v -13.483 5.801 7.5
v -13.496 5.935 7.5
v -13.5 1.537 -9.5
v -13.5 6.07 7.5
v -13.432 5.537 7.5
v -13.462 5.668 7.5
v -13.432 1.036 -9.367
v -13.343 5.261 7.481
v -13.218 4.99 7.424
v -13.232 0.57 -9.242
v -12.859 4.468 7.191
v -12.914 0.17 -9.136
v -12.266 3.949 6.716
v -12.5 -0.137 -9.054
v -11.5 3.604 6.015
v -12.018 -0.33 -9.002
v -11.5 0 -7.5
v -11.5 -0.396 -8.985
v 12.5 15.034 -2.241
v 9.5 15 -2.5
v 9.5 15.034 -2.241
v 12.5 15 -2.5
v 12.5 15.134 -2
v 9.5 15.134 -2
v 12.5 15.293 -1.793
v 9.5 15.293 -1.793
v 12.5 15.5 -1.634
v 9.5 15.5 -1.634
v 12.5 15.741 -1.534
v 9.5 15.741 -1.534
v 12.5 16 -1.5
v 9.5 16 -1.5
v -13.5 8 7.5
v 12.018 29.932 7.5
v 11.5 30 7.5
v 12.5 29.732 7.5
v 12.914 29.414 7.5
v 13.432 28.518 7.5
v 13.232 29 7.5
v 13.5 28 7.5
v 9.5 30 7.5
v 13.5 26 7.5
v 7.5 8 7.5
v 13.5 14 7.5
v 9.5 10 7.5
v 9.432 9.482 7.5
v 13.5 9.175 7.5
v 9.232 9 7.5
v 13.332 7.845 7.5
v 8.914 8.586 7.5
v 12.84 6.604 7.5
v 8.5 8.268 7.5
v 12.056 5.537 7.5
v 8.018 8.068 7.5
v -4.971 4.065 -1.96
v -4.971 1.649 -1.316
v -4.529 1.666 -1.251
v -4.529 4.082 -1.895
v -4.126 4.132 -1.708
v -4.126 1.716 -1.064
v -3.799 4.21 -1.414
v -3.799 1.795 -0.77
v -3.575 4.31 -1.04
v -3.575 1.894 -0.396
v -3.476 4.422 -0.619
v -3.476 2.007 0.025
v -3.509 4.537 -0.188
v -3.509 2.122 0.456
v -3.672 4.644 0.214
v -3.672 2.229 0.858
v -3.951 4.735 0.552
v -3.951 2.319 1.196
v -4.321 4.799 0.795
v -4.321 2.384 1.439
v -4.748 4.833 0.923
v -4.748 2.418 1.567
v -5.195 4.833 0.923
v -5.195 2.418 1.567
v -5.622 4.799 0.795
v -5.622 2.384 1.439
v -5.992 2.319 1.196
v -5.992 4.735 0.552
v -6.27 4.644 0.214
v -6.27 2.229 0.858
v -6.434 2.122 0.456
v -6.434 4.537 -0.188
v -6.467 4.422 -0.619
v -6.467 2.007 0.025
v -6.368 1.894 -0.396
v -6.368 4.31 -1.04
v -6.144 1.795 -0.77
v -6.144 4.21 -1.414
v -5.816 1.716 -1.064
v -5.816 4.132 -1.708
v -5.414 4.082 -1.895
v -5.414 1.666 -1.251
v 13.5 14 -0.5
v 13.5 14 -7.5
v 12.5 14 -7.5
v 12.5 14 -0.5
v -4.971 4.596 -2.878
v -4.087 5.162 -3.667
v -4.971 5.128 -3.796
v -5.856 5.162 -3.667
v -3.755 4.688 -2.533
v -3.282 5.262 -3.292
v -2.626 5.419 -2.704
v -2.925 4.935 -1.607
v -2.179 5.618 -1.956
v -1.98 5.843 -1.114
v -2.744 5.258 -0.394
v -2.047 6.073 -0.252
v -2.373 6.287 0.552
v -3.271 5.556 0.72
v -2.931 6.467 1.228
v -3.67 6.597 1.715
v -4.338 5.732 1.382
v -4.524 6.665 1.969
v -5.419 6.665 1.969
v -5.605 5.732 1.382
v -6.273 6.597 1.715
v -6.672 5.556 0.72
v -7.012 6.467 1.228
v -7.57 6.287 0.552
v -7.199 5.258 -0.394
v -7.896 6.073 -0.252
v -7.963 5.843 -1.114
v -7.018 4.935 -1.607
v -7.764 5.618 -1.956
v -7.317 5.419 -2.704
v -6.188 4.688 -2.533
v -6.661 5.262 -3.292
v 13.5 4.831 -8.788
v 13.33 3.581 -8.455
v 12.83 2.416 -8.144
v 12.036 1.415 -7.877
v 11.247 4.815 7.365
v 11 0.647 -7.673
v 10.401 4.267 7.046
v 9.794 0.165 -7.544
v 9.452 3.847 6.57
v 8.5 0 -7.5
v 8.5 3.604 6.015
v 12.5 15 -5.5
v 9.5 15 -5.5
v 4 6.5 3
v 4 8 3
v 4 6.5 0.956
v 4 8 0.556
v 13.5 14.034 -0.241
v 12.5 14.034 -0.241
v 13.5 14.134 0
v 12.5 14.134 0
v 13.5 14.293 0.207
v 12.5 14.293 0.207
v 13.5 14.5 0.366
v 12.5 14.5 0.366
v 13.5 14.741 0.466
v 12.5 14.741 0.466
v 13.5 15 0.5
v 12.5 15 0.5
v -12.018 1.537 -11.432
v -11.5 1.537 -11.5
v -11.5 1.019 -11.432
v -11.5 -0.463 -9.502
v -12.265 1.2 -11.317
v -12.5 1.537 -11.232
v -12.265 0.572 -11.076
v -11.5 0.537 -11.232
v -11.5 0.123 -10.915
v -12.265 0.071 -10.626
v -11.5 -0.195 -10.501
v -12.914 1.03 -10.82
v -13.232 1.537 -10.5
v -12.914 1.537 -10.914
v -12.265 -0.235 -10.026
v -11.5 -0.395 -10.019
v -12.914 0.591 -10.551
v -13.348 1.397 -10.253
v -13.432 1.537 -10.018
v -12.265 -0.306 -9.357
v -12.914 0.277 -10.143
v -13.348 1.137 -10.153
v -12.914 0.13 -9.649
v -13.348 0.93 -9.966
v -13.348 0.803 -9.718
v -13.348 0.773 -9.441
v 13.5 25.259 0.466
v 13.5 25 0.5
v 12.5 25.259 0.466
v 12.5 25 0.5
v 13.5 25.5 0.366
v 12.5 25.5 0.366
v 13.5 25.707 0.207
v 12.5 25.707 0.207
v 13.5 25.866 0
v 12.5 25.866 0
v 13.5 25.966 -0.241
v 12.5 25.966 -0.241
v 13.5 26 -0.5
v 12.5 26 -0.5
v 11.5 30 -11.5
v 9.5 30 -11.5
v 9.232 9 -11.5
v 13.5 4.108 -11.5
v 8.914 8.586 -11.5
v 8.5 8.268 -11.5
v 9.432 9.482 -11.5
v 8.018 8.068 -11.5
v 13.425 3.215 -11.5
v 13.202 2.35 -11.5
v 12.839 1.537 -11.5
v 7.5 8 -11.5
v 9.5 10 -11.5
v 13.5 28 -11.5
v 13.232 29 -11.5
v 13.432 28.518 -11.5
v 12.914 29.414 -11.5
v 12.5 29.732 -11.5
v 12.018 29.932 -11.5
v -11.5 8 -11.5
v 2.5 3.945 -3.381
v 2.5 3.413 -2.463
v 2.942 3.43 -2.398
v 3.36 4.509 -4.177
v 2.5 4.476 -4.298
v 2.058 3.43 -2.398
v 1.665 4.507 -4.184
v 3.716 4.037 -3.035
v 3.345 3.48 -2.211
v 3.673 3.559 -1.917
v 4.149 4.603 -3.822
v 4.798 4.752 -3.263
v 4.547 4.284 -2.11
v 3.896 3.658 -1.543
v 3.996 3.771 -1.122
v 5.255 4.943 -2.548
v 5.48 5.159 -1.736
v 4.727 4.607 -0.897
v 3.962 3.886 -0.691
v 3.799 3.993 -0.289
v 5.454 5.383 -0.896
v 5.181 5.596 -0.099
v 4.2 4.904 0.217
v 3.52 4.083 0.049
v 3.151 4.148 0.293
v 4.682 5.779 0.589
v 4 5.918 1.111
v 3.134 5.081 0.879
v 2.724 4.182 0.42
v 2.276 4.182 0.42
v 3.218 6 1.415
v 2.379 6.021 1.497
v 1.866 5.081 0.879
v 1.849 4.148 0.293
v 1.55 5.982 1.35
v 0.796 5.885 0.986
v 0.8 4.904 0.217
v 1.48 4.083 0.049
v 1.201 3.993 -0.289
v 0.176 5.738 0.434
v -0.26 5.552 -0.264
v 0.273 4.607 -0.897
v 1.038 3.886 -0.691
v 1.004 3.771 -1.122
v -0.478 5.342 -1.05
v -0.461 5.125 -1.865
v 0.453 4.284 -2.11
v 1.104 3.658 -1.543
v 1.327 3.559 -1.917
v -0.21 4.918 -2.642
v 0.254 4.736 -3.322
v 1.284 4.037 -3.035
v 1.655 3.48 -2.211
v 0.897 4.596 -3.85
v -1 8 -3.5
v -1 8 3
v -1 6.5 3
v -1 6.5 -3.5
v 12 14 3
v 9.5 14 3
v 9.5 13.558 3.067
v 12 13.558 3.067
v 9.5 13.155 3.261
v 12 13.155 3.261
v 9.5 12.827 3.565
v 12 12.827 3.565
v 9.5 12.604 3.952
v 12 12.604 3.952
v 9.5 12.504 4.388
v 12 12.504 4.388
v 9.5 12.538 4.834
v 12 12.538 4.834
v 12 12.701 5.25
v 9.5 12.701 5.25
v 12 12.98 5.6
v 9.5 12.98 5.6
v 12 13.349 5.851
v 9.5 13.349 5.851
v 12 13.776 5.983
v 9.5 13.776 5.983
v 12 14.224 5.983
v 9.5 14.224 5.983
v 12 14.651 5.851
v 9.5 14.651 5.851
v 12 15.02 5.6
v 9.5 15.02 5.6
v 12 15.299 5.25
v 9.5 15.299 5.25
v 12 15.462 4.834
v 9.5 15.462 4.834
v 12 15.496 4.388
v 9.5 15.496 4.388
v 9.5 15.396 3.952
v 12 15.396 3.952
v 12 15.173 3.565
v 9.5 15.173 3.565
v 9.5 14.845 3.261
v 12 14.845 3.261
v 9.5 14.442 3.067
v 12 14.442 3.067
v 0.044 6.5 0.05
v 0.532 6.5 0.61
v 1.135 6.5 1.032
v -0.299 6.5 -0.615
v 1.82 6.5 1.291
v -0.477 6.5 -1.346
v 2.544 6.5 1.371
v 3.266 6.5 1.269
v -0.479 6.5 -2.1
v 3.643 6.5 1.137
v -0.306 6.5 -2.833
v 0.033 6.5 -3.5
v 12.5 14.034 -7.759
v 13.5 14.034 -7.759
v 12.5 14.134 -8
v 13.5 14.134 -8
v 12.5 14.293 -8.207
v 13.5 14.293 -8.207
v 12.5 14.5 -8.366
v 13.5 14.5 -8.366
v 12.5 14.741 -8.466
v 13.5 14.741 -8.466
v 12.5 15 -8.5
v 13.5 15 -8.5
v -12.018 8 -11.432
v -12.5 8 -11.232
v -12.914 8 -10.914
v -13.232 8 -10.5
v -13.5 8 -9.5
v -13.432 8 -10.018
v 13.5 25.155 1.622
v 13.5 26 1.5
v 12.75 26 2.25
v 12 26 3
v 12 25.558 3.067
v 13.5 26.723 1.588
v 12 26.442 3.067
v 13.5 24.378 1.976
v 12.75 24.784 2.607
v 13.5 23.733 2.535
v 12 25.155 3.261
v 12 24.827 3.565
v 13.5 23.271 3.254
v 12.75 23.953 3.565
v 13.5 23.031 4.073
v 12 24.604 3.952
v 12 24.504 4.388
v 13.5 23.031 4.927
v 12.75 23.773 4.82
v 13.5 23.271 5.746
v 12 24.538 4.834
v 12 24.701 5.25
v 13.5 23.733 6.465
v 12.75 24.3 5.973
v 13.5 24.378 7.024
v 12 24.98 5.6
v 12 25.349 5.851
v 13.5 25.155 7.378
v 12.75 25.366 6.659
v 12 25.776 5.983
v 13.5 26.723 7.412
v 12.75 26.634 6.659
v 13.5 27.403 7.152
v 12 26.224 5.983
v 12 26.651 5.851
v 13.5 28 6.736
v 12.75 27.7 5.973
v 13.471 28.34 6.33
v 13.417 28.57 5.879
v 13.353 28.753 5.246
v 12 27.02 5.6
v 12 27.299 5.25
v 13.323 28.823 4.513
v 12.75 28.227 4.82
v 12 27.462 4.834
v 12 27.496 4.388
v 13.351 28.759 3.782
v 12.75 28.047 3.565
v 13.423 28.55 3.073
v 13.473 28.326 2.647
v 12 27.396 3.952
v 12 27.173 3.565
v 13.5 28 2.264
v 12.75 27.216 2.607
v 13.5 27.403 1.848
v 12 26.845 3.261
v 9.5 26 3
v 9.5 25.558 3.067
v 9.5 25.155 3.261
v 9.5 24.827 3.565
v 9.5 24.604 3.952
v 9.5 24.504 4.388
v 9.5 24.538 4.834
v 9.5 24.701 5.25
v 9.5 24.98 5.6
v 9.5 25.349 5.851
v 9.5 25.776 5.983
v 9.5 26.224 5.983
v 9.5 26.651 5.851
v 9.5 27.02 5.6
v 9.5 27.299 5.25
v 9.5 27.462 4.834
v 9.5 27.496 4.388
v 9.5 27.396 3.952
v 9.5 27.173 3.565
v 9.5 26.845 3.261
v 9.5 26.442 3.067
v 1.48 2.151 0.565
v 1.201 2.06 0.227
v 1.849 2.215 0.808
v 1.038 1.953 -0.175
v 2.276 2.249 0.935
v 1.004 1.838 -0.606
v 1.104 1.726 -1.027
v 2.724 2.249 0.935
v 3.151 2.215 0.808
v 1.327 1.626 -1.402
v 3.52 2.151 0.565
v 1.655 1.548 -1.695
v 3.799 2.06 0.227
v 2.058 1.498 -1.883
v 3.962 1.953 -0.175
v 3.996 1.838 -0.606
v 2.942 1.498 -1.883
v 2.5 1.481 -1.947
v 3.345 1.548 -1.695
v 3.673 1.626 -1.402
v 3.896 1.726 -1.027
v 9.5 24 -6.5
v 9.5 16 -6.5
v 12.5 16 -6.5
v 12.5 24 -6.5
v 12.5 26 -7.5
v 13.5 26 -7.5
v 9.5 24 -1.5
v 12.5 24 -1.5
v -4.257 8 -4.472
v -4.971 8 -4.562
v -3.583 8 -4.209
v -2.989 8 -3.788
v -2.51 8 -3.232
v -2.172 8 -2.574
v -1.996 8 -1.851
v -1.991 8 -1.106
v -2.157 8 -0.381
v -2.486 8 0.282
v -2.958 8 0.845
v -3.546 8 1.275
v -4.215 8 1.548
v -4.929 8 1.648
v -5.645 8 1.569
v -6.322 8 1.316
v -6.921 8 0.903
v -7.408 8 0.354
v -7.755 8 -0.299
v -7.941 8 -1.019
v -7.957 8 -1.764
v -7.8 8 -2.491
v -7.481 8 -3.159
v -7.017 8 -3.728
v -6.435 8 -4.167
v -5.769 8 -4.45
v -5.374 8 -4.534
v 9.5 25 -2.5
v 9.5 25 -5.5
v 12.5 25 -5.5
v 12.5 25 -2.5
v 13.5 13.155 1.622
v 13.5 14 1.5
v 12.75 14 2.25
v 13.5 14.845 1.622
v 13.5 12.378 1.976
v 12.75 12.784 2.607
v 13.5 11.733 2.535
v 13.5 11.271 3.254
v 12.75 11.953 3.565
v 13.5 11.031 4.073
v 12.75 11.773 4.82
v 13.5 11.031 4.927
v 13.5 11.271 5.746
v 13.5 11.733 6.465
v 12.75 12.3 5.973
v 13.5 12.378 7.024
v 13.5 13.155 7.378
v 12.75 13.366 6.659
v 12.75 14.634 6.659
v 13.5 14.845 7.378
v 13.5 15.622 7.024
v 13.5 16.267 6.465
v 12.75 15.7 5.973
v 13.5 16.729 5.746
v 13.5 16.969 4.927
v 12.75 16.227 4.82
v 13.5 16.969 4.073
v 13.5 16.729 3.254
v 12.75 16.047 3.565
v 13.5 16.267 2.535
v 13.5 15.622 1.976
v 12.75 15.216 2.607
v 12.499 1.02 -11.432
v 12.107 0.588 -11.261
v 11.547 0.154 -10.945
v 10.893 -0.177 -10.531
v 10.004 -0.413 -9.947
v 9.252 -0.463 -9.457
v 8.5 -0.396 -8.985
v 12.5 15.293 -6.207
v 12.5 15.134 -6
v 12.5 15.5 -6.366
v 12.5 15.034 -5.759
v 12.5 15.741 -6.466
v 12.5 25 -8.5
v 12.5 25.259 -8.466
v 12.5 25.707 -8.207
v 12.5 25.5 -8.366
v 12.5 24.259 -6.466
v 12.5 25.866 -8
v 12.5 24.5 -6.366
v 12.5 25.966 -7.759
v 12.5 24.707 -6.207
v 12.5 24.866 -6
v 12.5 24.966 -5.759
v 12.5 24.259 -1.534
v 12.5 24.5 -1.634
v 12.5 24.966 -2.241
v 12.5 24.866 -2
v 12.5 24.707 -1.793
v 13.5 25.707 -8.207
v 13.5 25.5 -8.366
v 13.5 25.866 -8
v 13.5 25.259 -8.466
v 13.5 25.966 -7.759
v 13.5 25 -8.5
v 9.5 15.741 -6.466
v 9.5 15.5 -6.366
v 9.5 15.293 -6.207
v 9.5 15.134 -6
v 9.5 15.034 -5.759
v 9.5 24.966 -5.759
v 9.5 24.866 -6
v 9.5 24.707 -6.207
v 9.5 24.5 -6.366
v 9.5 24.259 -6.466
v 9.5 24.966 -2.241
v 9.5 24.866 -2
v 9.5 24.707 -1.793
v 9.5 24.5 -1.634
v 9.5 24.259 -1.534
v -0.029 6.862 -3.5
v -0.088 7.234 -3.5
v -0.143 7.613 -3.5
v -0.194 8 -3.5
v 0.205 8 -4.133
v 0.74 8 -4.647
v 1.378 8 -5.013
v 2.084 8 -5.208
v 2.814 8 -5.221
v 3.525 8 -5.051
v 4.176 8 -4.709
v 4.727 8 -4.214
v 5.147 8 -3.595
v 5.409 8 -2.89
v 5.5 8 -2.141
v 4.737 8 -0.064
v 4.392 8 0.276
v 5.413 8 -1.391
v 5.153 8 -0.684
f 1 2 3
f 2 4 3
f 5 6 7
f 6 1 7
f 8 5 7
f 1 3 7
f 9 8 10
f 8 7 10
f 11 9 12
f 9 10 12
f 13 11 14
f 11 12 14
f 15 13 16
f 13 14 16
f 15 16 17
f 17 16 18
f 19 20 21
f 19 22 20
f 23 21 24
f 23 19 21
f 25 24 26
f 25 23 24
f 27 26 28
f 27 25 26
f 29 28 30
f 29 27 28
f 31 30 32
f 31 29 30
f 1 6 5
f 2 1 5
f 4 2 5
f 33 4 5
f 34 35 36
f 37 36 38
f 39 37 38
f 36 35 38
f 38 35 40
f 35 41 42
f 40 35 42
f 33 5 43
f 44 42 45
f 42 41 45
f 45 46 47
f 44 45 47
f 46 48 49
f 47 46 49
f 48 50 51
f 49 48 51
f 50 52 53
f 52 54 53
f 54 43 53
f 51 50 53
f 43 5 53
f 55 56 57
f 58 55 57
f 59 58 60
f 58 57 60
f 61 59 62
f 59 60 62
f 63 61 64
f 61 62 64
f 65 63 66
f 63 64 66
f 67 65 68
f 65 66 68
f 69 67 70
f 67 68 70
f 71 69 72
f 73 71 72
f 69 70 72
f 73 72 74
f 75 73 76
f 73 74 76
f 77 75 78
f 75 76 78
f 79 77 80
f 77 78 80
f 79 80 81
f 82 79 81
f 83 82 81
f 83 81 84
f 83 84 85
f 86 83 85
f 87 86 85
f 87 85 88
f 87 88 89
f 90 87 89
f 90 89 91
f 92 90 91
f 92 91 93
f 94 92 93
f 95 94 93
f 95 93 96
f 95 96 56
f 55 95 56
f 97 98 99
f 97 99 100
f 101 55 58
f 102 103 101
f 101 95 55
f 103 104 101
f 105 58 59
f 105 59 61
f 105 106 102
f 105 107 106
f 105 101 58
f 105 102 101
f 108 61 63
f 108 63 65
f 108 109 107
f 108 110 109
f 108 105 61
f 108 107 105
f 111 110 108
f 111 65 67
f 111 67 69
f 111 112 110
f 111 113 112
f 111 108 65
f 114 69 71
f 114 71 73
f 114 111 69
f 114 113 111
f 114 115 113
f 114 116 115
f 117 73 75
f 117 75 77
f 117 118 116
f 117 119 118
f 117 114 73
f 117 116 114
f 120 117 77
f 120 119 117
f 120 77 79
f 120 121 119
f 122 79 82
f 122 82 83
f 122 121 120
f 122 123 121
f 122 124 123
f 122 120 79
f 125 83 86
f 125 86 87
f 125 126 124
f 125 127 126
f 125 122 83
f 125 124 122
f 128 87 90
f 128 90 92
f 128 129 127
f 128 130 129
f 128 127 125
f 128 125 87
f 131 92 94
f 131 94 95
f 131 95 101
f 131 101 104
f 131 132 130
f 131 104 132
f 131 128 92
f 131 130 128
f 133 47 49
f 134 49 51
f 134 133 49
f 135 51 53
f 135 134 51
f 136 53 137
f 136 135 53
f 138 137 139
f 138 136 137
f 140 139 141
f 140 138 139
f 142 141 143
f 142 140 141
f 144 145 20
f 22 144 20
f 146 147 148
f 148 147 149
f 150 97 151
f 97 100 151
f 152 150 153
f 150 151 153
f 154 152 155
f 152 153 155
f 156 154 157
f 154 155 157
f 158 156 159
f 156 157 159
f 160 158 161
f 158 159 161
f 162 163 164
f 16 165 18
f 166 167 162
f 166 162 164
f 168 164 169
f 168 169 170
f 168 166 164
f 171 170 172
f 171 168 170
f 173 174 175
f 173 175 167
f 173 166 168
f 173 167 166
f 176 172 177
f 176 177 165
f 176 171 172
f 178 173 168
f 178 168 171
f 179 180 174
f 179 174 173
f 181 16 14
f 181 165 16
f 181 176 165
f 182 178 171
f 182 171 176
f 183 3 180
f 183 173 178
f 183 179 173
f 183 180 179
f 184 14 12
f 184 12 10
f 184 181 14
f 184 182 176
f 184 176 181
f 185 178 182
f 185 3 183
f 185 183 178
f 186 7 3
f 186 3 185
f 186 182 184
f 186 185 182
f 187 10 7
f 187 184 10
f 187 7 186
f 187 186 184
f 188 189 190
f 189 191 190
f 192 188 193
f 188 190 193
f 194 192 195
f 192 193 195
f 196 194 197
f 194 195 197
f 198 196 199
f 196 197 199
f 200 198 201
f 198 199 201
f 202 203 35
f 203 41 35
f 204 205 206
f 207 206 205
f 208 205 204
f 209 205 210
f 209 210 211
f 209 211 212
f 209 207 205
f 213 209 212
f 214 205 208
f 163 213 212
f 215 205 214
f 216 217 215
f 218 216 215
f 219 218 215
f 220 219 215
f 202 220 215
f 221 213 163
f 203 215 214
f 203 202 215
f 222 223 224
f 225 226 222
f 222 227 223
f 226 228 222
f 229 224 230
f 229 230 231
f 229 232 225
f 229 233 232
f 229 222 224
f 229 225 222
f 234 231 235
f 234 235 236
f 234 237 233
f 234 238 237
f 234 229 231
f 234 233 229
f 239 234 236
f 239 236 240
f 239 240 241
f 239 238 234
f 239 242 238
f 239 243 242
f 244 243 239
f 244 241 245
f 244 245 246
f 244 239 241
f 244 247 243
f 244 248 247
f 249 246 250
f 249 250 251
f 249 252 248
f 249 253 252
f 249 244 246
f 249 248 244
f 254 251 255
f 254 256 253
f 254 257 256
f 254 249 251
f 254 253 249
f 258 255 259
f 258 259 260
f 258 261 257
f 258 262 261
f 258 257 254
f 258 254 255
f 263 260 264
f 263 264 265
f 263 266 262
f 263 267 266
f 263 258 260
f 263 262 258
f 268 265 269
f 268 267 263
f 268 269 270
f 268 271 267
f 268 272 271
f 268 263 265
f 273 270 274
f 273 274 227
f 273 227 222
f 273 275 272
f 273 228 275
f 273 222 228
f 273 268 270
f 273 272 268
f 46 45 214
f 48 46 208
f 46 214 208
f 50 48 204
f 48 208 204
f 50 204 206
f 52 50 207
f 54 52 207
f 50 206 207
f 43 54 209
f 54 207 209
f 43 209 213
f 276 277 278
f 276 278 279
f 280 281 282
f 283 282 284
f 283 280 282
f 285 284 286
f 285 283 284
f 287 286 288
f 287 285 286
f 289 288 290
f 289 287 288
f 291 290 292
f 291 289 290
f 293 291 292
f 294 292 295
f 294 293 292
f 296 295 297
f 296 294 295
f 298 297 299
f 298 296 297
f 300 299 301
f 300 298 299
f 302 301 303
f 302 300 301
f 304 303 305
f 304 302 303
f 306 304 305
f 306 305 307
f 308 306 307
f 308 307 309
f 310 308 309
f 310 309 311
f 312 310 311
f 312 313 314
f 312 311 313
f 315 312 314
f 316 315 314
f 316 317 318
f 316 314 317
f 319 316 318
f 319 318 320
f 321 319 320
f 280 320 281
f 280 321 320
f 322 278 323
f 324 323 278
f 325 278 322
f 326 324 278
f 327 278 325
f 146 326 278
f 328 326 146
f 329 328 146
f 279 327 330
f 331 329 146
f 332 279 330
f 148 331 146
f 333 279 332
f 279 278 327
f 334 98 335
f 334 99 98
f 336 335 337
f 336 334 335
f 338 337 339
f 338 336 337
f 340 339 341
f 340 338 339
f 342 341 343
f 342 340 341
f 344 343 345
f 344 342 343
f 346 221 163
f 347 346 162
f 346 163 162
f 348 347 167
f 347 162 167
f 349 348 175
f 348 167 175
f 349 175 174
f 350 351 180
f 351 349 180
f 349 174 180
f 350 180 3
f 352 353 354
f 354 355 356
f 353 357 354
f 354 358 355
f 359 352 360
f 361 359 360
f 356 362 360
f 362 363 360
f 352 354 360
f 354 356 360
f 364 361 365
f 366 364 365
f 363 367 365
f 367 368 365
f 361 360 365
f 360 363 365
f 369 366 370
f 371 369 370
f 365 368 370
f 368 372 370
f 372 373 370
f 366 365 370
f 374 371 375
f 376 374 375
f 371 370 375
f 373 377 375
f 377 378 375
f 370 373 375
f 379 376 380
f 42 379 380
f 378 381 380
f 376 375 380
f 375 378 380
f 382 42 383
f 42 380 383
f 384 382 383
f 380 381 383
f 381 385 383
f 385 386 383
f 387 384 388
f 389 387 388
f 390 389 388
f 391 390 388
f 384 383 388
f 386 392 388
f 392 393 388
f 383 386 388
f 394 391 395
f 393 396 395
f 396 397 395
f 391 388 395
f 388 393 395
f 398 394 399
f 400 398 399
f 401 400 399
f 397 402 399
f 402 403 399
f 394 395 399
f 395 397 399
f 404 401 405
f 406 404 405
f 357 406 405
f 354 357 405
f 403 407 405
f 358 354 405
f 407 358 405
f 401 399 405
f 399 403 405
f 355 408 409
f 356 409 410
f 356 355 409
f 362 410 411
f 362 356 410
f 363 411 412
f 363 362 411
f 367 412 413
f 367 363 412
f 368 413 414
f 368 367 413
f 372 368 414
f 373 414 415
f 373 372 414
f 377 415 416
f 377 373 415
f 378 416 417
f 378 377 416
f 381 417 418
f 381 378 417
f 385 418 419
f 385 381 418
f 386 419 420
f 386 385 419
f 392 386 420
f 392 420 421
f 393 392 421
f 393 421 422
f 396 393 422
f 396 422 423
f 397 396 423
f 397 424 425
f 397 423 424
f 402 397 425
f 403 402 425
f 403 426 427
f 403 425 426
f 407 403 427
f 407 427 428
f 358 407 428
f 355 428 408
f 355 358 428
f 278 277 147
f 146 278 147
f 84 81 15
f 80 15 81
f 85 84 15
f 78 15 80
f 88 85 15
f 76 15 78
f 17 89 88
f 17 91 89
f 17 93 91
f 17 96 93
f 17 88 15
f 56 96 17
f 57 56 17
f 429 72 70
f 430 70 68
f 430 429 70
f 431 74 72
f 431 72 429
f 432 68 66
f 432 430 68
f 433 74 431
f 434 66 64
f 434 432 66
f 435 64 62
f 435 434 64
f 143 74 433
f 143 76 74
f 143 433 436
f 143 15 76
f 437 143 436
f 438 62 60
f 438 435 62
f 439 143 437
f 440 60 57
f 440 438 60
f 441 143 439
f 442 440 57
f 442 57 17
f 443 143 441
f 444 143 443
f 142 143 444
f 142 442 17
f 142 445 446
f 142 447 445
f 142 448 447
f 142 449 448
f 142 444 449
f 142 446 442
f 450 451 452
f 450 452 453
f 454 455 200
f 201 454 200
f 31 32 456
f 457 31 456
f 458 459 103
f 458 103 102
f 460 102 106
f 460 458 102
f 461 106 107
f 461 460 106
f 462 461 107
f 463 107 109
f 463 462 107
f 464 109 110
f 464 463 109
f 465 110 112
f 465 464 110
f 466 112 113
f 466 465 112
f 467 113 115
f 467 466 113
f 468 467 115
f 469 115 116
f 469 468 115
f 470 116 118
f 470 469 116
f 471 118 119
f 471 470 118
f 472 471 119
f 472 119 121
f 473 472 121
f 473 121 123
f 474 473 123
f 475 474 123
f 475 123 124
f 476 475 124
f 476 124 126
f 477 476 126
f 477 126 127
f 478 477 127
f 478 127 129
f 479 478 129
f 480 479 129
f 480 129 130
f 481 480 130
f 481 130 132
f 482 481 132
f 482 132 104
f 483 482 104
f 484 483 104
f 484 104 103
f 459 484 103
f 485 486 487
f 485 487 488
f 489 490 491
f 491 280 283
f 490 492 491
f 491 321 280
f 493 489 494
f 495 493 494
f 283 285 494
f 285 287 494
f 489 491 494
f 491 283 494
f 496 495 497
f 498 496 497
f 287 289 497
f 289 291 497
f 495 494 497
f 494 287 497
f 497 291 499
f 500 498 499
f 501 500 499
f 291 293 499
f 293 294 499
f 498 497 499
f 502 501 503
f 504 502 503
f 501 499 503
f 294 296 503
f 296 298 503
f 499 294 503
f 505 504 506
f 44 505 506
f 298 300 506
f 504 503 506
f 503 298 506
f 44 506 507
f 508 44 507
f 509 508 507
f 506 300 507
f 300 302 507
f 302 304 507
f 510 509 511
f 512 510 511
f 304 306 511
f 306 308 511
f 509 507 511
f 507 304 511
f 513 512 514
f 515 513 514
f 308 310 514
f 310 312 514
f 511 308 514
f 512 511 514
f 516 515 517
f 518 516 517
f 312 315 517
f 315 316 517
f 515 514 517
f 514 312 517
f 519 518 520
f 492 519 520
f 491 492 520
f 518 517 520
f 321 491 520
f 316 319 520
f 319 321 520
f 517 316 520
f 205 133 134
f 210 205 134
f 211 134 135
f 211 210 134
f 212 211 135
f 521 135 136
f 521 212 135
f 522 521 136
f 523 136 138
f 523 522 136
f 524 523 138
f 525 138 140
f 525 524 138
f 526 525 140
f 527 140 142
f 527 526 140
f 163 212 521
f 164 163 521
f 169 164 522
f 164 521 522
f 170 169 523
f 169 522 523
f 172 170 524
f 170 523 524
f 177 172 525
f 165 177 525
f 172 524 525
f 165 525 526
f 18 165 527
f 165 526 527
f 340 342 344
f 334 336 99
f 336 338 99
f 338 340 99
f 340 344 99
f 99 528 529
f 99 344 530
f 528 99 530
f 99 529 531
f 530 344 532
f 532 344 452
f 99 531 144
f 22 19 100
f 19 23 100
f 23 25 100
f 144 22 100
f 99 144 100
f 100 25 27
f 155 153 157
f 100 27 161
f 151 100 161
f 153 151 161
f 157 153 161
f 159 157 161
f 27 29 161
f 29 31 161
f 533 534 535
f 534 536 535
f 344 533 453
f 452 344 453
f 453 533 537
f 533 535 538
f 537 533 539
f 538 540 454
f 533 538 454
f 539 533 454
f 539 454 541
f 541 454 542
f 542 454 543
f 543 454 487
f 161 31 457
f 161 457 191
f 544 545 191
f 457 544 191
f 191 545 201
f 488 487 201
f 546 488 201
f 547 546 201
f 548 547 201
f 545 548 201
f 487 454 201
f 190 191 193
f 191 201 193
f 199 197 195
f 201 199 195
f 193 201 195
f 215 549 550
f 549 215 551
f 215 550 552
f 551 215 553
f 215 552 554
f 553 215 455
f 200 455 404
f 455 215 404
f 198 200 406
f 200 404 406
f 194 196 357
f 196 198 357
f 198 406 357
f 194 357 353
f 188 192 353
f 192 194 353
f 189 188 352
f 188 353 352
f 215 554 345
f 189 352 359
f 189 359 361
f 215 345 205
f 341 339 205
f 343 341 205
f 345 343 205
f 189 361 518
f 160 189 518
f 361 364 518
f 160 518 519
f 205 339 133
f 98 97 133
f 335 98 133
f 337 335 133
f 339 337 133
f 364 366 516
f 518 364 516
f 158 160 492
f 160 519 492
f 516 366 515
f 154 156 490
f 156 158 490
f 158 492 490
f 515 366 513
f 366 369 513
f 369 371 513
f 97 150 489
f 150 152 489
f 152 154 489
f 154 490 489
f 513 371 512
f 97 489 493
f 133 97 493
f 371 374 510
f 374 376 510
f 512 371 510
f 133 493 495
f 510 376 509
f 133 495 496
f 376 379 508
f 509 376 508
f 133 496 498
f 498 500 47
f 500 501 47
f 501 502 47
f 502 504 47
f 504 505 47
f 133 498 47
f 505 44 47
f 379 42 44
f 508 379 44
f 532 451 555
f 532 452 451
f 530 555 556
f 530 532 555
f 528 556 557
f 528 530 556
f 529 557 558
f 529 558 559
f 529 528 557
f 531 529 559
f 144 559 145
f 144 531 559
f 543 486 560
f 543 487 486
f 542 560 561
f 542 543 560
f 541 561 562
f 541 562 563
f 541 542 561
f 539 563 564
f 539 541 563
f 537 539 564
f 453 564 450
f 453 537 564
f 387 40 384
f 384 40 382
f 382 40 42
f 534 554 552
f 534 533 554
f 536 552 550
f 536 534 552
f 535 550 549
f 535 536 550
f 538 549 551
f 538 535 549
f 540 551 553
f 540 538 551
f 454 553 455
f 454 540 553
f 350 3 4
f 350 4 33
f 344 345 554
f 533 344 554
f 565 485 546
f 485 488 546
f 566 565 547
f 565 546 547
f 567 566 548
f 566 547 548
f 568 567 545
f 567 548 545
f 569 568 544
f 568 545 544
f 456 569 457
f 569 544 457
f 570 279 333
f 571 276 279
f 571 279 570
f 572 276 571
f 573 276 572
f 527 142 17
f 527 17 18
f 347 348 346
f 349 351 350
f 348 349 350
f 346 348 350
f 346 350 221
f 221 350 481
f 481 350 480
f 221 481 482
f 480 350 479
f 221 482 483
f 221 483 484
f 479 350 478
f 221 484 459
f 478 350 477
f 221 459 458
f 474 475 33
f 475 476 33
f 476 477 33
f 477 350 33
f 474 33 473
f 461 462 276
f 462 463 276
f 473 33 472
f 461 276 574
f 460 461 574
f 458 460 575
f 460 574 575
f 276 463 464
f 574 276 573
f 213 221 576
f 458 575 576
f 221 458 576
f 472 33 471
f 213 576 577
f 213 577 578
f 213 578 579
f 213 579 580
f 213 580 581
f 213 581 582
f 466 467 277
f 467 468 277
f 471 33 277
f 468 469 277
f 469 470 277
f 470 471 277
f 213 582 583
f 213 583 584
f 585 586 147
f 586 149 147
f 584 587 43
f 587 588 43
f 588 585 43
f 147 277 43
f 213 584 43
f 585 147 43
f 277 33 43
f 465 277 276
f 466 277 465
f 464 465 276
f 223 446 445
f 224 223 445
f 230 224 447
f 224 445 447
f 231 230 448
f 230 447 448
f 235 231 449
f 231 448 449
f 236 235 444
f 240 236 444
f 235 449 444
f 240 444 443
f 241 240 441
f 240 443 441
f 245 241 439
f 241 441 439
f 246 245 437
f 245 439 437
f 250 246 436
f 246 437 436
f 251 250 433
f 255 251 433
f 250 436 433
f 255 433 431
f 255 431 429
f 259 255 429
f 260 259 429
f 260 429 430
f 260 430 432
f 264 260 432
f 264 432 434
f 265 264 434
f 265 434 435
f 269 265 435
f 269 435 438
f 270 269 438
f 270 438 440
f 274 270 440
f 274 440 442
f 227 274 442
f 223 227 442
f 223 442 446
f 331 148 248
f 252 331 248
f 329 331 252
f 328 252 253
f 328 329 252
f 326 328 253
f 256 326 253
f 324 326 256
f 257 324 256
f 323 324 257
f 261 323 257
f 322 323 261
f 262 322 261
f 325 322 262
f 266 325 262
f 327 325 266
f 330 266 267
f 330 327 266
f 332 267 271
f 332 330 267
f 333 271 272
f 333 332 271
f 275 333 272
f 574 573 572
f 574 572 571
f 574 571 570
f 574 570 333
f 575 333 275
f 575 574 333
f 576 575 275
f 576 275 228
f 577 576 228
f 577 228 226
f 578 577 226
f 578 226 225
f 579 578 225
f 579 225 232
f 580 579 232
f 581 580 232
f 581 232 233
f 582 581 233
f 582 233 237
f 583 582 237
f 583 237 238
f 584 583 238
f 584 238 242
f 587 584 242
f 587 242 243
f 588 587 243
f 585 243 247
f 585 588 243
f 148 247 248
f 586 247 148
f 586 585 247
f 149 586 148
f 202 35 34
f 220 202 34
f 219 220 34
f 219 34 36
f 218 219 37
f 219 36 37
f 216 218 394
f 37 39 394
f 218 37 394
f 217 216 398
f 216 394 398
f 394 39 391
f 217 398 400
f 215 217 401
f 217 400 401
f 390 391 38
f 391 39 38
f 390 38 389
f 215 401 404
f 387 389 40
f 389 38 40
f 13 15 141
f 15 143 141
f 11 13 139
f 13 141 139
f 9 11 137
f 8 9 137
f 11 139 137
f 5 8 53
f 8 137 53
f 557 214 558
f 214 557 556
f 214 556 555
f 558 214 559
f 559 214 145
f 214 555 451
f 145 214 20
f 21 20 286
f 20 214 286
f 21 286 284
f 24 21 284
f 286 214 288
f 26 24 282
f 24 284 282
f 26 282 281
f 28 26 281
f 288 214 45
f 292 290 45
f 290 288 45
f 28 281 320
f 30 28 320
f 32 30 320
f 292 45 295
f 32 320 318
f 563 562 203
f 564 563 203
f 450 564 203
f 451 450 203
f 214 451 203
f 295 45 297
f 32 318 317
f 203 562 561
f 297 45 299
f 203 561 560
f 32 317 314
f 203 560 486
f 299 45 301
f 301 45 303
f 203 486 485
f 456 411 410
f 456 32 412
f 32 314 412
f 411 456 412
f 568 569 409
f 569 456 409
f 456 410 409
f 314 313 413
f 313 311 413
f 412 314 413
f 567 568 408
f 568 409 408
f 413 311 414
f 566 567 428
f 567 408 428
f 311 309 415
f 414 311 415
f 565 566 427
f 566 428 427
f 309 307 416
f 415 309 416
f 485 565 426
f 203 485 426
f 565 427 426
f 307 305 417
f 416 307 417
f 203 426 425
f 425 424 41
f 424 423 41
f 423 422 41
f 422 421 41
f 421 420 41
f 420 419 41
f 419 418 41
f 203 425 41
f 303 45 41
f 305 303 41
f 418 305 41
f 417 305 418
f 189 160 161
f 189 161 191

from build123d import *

# Parameters (mm, degrees)
SKETCH_1_W                = 27
SKETCH_1_H                = 15
EXTRUDE_1_DEPTH           = 8
CUT_EXTRUDE_8_DEPTH       = 41.5
SKETCH_5_W                = 4
SKETCH_5_H                = 15
EXTRUDE_3_DEPTH           = 24
SKETCH_7_W                = 5
SKETCH_7_H                = 6.5
CUT_EXTRUDE_5_DEPTH       = 1.5
SKETCH_10_R               = 1.5
CUT_EXTRUDE_6_DEPTH       = 21.5
SKETCH_12_W               = 5
SKETCH_12_H               = 10
CUT_EXTRUDE_7_DEPTH       = 21.5
SKETCH_14_W               = 4
SKETCH_14_H               = 2
CUT_EXTRUDE_9_DEPTH       = 21.5
SKETCH_15_R               = 1.5
CUT_EXTRUDE_10_DEPTH      = 21.5
EXTRUDE_6_DEPTH           = 4
CUT_EXTRUDE_13_DEPTH      = 1.5
CUT_EXTRUDE_13_DEPTH_BACK = 12
SKETCH_17_R               = 3
CUT_EXTRUDE_15_DEPTH      = 1
CUT_EXTRUDE_15_DEPTH_BACK = 2.5
SKETCH_19_R               = 3
CUT_EXTRUDE_16_DEPTH      = 54
SKETCH_23_W               = 9
SKETCH_23_H               = 12
CUT_EXTRUDE_17_DEPTH      = 1
FILLET_2_R                = 2
FILLET_3_R                = 2
FILLET_4_R                = 5
CHAMFER_1_SIZE            = 1.5
FILLET_5_R                = 2
FILLET_8_R                = 1


with BuildPart() as part:
    # 草图1 → 凸台-拉伸1 (new body)
    with BuildSketch(Plane(origin=(0, 0, 0), x_dir=(1, 0, 0), z_dir=(0, 1, 0))):
        Rectangle(SKETCH_1_W, SKETCH_1_H)
    extrude(amount=EXTRUDE_1_DEPTH)

    # 草图13 → 切除-拉伸8 (cut)
    with BuildSketch(Plane(origin=(13.5, 0, 0), x_dir=(0, 0, -1), z_dir=(1, 0, 0))):
        Polygon((-7.5, 4), (7.5, 0), (-7.5, 0), align=None)
    extrude(amount=-CUT_EXTRUDE_8_DEPTH, mode=Mode.SUBTRACT)

    # 草图5 → 凸台-拉伸3 (add)
    with BuildSketch(Plane(origin=(0, 8, 0), x_dir=(1, 0, 0), z_dir=(0, 1, 0))):
        with Locations((11.5, 0)):
            Rectangle(SKETCH_5_W, SKETCH_5_H)
    extrude(amount=EXTRUDE_3_DEPTH)

    # 草图7 → 切除-拉伸5 (cut)
    with BuildSketch(Plane(origin=(0, 8, 0), x_dir=(1, 0, 0), z_dir=(0, 1, 0))):
        with Locations((1.5, 0.25)):
            Rectangle(SKETCH_7_W, SKETCH_7_H)
    extrude(amount=-CUT_EXTRUDE_5_DEPTH, mode=Mode.SUBTRACT)

    # 草图10 → 切除-拉伸6 (cut)
    with BuildSketch(Plane.ZY.offset(-13.5)):
        with Locations(Location((4.5, 14, 0), (0, 0, 180))):
            Circle(SKETCH_10_R)
        with Locations(Location((4.5, 26, 0), (0, 0, 180))):
            Circle(SKETCH_10_R)
    extrude(amount=CUT_EXTRUDE_6_DEPTH, mode=Mode.SUBTRACT)

    # 草图12 → 切除-拉伸7 (cut)
    with BuildSketch(Plane.ZY.offset(-9.5)):
        with Locations((-4, 20)):
            Rectangle(SKETCH_12_W, SKETCH_12_H)
    extrude(amount=-CUT_EXTRUDE_7_DEPTH, mode=Mode.SUBTRACT)

    # 草图14 → 切除-拉伸9 (cut)
    with BuildSketch(Plane.XY.offset(7.5)):
        with Locations((11.5, 31)):
            Rectangle(SKETCH_14_W, SKETCH_14_H)
    extrude(amount=-CUT_EXTRUDE_9_DEPTH, mode=Mode.SUBTRACT)

    # 草图15 → 切除-拉伸10 (cut)
    with BuildSketch(Plane(origin=(0, 1.867219917, -0.497925311), x_dir=(1, 0, 0), z_dir=(0, -0.9662349396012463, 0.25766265056033233))):
        with Locations(Location((-4.971460236, 0.653668071, 0), (0, 0, 270))):
            Circle(SKETCH_15_R)
        with Locations(Location((2.5, 0, 0), (0, 0, 270))):
            Circle(SKETCH_15_R)
    extrude(amount=-CUT_EXTRUDE_10_DEPTH, mode=Mode.SUBTRACT)

    # 草图21 → 凸台-拉伸6 (add)
    with BuildSketch(Plane(origin=(0, 0, -7.5), x_dir=(-1, 0, 0), z_dir=(0, 0, -1))):
        Polygon((-13.5, -1.987071707), (11.82839978, -1.987071707), (13.5, -1.987071707), (13.5, 8), (-9.5, 8), (-9.5, 30), (-13.5, 30), (-13.5, 8), align=None)
    extrude(amount=EXTRUDE_6_DEPTH)

    # 草图17 → 切除-拉伸13 (cut, two sides: drawn at the far end of the back side and taken through both)
    with BuildSketch(Plane(origin=(0, 6.698394615, -1.786238564), x_dir=(-1, 0, 0), z_dir=(0, -0.9662349396012463, 0.25766265056033233)).offset(-CUT_EXTRUDE_13_DEPTH_BACK)):
        with Locations(Location((-2.5, 0, 0), (0, 0, 240))):
            Circle(SKETCH_17_R)
    extrude(amount=CUT_EXTRUDE_13_DEPTH + CUT_EXTRUDE_13_DEPTH_BACK, mode=Mode.SUBTRACT)

    # 草图19 → 切除-拉伸15 (cut, two sides: drawn at the far end of the back side and taken through both)
    with BuildSketch(Plane(origin=(0, 6.698394615, -1.786238564), x_dir=(-1, 0, 0), z_dir=(0, -0.9662349396012463, 0.25766265056033233)).offset(-CUT_EXTRUDE_15_DEPTH_BACK)):
        with Locations(Location((4.971460236, -0.653668071, 0), (0, 0, 90))):
            Circle(SKETCH_19_R)
    extrude(amount=CUT_EXTRUDE_15_DEPTH + CUT_EXTRUDE_15_DEPTH_BACK, mode=Mode.SUBTRACT)

    # 草图22 → 切除-拉伸16 (cut)
    with BuildSketch(Plane(origin=(13.5, 0, 0), x_dir=(0, 0, -1), z_dir=(1, 0, 0))):
        Polygon((-7.5, 4), (7.5, 0), (11.5, -1.066666667), (11.5, -3.267506917), (3.736378374, -2.578943079), align=None)
    extrude(amount=-CUT_EXTRUDE_16_DEPTH, mode=Mode.SUBTRACT)

    # 草图23 → 切除-拉伸17 (cut)
    with BuildSketch(Plane.ZY.offset(-13.5)):
        with Locations((-4, 20)):
            Rectangle(SKETCH_23_W, SKETCH_23_H)
    extrude(amount=CUT_EXTRUDE_17_DEPTH, mode=Mode.SUBTRACT)

    # 圆角2
    fillet_2_edges = [part.edges().sort_by_distance(p)[0] for p in [
        (9.5, 8, -2),
    ]]
    fillet(fillet_2_edges, radius=FILLET_2_R)

    # 圆角3
    fillet_3_edges = [part.edges().sort_by_distance(p)[0] for p in [
        (13.5, 30, -2),
    ]]
    fillet(fillet_3_edges, radius=FILLET_3_R)

    # 圆角4
    fillet_4_edges = [part.edges().sort_by_distance(p)[0] for p in [
        (13.5, 1.466666667, -2),
    ]]
    fillet(fillet_4_edges, radius=FILLET_4_R)

    # 倒角1
    # the kernel refuses this chamfer: 1.5 mm, written as the material it takes off along each edge
    with BuildSketch(Plane(origin=(2.5, 5.249042206, -1.399744588), x_dir=(0, -0.2576626505603323, -0.9662349396012463), z_dir=(-1, 0, 0))) as chamfer_1_piece_1_section:
        Polygon((1.5, CHAMFER_1_SIZE), (1.5 + CHAMFER_1_SIZE, 0), (1.5, 0), align=None)
    chamfer_1_piece_1 = revolve(axis=Axis((2.5, 5.249042206, -1.399744588), (0, -0.9662349396012463, 0.25766265056033233)), mode=Mode.PRIVATE)
    chamfer_1_piece_1 = chamfer_1_piece_1 & Plane(origin=(2.5, 4.520895406, -1.205572108), x_dir=(0.5000000000000004, 0.22314240099168048, 0.8367840037188018), z_dir=(0, -0.9662349396012463, 0.25766265056033233)) * Cylinder(3, 12, mode=Mode.PRIVATE)
    add(chamfer_1_piece_1, mode=Mode.SUBTRACT)
    with BuildSketch(Plane(origin=(-4.971460236, 5.900585523, -0.896978985), x_dir=(0, -0.25766265056033244, -0.9662349396012462), z_dir=(-1, 0, 0))) as chamfer_1_piece_2_section:
        Polygon((1.5, CHAMFER_1_SIZE), (1.5 + CHAMFER_1_SIZE, 0), (1.5, 0), align=None)
    chamfer_1_piece_2 = revolve(axis=Axis((-4.971460236, 5.900585523, -0.896978985), (0, -0.9662349396012463, 0.25766265056033233)), mode=Mode.PRIVATE)
    chamfer_1_piece_2 = chamfer_1_piece_2 & Plane(origin=(-4.971460236, 5.172438723, -0.702806505), x_dir=(0, -0.25766265056033233, -0.9662349396012463), z_dir=(0, 0.9662349396012463, -0.25766265056033233)) * Cylinder(3, 13, mode=Mode.PRIVATE)
    add(chamfer_1_piece_2, mode=Mode.SUBTRACT)
    with BuildSketch(Plane(origin=(13.5, 14, 4.5), x_dir=(0, 0, -1), z_dir=(0, 1, 0))) as chamfer_1_piece_3:
        Polygon((1.5 + CHAMFER_1_SIZE, 0), (1.5, CHAMFER_1_SIZE), (1.5, 0), align=None)
    revolve(axis=Axis((13.5, 14, 4.5), (-1, 0, 0)), mode=Mode.SUBTRACT)
    with BuildSketch(Plane(origin=(13.5, 26, 4.5), x_dir=(0, 0, -1), z_dir=(0, 1, 0))) as chamfer_1_piece_4:
        Polygon((1.5 + CHAMFER_1_SIZE, 0), (1.5, CHAMFER_1_SIZE), (1.5, 0), align=None)
    revolve(axis=Axis((13.5, 26, 4.5), (-1, 0, 0)), mode=Mode.SUBTRACT)

    # 圆角5
    # the kernel refuses this fillet: 2 mm, written as the material it takes off along each edge
    with BuildSketch(Plane(origin=(-11.5, 1.536556626, -9.5), x_dir=(0, 0, -1), z_dir=(-1, 0, 0))) as fillet_5_piece_1_section:
        Polygon((0, 0), (FILLET_5_R * 1.02, 0), (FILLET_5_R * 1.02, FILLET_5_R * 1.32764387935), (-FILLET_5_R * 0.262815903572, FILLET_5_R * 0.985559638393), align=None)
    fillet_5_piece_1 = extrude(amount=FILLET_5_R * 1.02, mode=Mode.PRIVATE)
    fillet_5_piece_1 = fillet_5_piece_1 - Plane(origin=(-11.5, 1.536556626, -9.5), x_dir=(0, 0.7929888557099438, 0.6092361403592483), z_dir=(-1, 0, 0)) * Sphere(FILLET_5_R, mode=Mode.PRIVATE)
    add(fillet_5_piece_1, mode=Mode.SUBTRACT)
    with BuildSketch(Plane(origin=(-13.5, -0.395913253, -8.984674699), x_dir=(1, 0, 0), z_dir=(0, 0.2576626505603323, 0.9662349396012463))) as fillet_5_piece_2:
        with BuildLine():
            CenterArc((FILLET_5_R, FILLET_5_R), FILLET_5_R, 180, 90)
            Line((0, FILLET_5_R), (0, 0))
            Line((0, 0), (FILLET_5_R, 0))
        make_face()
    extrude(amount=22.060731322, mode=Mode.SUBTRACT)
    with BuildSketch(Plane(origin=(12.341391565, 4, 7.5), x_dir=(0, 1, 0), z_dir=(-1, 0, 0))) as fillet_5_piece_3:
        with BuildLine():
            CenterArc((FILLET_5_R * 0.768278313084, FILLET_5_R), FILLET_5_R, 194.931417178, 75.068582822)
            Line((-FILLET_5_R * 0.197956626517, FILLET_5_R * 0.74233734944), (0, 0))
            Line((0, 0), (FILLET_5_R * 0.768278313084, 0))
        make_face()
    extrude(amount=29.682783131, mode=Mode.SUBTRACT)
    with BuildSketch(Plane(origin=(15.008058232, -1.066666667, -11.5), x_dir=(0, 0.25766265056033255, 0.9662349396012463), z_dir=(-1, 0, 0))) as fillet_5_piece_4:
        with BuildLine():
            CenterArc((FILLET_5_R * 1.30161164642, FILLET_5_R), FILLET_5_R, 165.068582822, 104.931417178)
            Line((FILLET_5_R * 0.335376706816, FILLET_5_R * 1.25766265056), (0, 0))
            Line((0, 0), (FILLET_5_R * 1.30161164642, 0))
        make_face()
    extrude(amount=26.508058232, mode=Mode.SUBTRACT)
    with BuildSketch(Plane(origin=(-13.5, 1.536556626, -11.5), x_dir=(0, 0, 1), z_dir=(0, 1, 0))) as fillet_5_piece_5:
        with BuildLine():
            CenterArc((FILLET_5_R, FILLET_5_R), FILLET_5_R, 180, 90)
            Line((0, FILLET_5_R), (0, 0))
            Line((0, 0), (FILLET_5_R, 0))
        make_face()
    extrude(amount=11.463443374, mode=Mode.SUBTRACT)

    # 圆角8
    fillet_8_edges = [part.edges().sort_by_distance(p)[0] for p in [
        (11, 25, -1.5),
        (11, 25, -6.5),
        (11, 15, -6.5),
        (11, 15, -1.5),
        (13, 14, 0.5),
        (13, 26, 0.5),
        (13, 26, -8.5),
        (13, 14, -8.5),
    ]]
    fillet(fillet_8_edges, radius=FILLET_8_R)


solid = part.part
